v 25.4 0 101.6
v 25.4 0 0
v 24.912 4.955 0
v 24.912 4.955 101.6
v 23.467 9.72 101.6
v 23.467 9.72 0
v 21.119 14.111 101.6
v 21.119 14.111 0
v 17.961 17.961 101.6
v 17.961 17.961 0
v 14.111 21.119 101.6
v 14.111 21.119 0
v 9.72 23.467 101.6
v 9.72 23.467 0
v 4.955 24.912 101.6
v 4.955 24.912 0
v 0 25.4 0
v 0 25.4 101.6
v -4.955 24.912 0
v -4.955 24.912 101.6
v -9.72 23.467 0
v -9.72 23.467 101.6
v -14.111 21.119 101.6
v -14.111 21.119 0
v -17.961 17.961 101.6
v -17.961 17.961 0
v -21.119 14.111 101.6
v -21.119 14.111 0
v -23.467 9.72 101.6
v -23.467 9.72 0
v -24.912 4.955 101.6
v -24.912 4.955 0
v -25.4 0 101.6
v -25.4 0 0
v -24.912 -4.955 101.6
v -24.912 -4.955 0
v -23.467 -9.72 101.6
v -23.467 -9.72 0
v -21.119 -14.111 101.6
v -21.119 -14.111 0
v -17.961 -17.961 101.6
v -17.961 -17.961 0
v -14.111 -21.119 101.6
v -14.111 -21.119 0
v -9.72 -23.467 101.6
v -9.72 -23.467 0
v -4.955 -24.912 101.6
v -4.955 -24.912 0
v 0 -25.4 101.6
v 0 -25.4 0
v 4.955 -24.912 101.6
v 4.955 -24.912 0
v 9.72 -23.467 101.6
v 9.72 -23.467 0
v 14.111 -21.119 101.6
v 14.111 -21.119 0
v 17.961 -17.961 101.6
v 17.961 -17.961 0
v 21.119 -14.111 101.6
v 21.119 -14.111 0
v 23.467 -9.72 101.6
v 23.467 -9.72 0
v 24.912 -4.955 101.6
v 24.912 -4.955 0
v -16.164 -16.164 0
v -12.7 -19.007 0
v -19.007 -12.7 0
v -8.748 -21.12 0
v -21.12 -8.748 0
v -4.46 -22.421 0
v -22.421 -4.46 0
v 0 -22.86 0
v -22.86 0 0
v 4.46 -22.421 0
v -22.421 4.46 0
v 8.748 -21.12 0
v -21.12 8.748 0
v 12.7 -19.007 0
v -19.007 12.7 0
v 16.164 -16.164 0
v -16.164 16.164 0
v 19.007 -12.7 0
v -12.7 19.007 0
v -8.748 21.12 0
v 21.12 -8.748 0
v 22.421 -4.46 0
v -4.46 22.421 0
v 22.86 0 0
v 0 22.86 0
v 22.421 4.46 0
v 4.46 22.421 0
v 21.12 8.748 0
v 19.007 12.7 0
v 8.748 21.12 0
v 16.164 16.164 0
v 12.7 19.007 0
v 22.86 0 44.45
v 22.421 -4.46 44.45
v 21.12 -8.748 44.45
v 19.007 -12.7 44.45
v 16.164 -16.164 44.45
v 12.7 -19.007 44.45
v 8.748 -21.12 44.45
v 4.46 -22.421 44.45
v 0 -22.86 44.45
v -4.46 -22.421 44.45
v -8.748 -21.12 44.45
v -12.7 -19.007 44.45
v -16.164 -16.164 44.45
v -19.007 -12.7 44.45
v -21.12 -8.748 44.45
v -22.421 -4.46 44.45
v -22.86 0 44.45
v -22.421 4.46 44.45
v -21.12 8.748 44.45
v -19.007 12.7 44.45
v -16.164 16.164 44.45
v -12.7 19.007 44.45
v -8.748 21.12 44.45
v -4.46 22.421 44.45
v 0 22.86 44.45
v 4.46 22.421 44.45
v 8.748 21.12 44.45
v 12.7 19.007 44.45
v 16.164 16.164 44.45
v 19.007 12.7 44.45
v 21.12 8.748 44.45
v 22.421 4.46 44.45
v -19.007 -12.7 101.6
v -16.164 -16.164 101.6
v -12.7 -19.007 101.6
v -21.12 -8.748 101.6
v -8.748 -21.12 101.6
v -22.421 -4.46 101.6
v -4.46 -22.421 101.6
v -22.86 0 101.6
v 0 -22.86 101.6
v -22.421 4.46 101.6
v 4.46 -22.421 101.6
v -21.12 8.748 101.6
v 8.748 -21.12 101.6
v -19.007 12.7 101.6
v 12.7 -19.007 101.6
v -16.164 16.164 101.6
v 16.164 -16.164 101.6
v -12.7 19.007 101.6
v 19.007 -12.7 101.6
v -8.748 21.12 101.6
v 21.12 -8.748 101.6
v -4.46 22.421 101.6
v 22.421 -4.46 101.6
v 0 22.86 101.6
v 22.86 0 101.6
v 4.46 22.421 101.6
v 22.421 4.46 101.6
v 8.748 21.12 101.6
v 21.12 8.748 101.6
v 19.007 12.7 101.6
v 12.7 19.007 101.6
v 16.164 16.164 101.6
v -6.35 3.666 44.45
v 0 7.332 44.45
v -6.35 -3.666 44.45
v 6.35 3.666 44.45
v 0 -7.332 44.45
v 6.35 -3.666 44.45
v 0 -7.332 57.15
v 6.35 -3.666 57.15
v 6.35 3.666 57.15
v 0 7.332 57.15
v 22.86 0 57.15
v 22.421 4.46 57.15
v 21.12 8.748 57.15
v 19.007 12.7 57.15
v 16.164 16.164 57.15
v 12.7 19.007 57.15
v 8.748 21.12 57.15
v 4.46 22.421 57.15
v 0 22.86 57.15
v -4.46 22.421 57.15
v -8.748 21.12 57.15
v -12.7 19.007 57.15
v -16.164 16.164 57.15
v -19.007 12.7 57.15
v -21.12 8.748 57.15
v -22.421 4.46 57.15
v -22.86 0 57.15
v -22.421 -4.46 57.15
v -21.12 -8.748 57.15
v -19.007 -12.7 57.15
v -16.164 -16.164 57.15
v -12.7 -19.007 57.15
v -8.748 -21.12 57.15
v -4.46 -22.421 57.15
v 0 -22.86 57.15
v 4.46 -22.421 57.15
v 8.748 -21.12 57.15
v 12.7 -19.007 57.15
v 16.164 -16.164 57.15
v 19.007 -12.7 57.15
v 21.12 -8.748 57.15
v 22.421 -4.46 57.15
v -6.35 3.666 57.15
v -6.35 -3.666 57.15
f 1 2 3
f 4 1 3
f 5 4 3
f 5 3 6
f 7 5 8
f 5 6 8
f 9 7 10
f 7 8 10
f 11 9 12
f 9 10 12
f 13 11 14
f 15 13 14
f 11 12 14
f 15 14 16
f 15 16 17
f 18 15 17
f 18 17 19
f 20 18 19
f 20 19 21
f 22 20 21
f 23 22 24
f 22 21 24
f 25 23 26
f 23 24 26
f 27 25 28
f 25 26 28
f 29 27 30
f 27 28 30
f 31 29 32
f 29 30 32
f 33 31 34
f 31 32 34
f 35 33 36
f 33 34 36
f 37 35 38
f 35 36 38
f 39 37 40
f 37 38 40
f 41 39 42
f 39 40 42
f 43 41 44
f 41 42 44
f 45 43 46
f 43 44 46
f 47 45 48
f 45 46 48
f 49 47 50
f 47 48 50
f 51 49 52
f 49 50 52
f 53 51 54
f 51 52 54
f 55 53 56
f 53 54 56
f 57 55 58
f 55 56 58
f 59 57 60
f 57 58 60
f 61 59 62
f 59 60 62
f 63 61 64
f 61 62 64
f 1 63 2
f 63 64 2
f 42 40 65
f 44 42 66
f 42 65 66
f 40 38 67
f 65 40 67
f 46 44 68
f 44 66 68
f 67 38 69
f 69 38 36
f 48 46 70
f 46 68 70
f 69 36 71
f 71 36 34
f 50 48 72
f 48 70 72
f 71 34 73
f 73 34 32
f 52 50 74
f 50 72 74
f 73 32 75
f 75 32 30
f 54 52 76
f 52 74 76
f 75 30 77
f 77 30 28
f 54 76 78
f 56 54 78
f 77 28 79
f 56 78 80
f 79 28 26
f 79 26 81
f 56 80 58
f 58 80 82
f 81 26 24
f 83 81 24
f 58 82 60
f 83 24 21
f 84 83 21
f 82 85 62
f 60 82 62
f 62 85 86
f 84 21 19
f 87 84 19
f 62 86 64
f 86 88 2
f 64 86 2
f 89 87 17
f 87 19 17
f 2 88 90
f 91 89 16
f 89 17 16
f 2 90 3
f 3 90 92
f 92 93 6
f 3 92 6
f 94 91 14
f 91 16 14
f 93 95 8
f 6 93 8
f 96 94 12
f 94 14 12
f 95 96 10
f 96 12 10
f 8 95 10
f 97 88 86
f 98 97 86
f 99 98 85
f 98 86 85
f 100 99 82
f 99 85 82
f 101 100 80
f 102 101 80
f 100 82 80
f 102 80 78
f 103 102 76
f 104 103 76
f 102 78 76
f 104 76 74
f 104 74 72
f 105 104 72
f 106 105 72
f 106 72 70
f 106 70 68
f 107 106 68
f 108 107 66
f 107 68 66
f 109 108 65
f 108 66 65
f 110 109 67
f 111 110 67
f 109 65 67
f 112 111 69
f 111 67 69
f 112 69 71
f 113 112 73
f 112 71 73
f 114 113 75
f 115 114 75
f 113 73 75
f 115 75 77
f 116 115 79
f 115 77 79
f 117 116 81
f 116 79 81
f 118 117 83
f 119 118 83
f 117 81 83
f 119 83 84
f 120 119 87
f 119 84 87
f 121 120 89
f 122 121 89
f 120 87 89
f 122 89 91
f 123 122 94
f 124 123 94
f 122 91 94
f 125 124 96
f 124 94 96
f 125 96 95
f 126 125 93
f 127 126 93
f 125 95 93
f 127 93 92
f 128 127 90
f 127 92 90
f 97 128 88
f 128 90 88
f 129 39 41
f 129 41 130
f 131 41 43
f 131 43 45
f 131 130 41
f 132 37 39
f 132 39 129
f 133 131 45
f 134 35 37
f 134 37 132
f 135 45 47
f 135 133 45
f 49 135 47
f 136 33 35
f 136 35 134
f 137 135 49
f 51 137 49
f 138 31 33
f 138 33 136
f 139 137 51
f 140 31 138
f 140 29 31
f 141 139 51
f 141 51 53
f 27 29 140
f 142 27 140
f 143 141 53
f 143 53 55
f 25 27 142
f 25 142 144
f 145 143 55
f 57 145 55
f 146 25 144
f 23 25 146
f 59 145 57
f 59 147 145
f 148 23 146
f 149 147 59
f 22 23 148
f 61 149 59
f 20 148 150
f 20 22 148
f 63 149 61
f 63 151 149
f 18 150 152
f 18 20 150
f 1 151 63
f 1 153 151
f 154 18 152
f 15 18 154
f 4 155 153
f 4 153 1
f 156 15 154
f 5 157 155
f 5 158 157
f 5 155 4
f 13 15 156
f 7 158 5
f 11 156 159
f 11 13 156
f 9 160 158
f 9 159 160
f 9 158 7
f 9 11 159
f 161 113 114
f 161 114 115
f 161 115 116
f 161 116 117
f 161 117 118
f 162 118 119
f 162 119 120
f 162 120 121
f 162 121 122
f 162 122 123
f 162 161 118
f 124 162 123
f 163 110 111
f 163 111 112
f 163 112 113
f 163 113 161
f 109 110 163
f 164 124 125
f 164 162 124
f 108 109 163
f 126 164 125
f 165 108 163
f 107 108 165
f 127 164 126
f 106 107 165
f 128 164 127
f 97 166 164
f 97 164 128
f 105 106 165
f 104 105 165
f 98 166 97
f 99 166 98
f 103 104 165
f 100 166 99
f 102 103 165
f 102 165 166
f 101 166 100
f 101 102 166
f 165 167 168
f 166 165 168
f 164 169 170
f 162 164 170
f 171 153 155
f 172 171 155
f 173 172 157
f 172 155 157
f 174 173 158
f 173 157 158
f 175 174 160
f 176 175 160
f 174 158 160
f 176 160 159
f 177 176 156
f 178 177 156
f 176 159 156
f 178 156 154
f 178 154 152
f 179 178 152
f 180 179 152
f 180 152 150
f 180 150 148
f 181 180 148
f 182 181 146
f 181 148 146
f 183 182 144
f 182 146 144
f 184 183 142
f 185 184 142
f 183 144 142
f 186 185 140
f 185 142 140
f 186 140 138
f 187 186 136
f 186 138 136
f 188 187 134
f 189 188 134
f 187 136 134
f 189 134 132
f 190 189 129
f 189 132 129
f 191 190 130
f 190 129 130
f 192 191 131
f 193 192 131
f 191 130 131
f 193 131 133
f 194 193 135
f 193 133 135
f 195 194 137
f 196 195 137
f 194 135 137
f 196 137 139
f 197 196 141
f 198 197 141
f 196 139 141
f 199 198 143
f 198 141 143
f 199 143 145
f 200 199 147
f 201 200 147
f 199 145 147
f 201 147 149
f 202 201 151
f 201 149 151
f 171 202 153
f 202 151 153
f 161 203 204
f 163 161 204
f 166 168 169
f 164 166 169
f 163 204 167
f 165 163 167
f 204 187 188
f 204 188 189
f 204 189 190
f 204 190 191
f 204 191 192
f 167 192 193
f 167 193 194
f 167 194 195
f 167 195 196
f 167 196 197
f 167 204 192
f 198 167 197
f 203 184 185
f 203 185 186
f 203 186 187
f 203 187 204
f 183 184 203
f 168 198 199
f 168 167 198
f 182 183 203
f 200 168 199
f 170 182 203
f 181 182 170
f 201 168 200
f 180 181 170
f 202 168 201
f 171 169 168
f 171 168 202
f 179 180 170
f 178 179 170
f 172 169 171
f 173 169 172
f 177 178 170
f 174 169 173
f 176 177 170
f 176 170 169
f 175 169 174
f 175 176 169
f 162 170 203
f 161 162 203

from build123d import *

# Parameters (mm, degrees)
F0_R     = 25.4
F1_DEPTH = 101.6
F2_R     = 22.86
F3_DEPTH = 44.45
F4_R     = 22.86
F5_DEPTH = 44.45
F7_DEPTH = 57.151


with BuildPart() as f1:
    # F0 (on Top) → F1 (new body)
    with BuildSketch(Plane.XY):
        Circle(F0_R)
    extrude(amount=F1_DEPTH)

    # F2 (on face) → F3 (cut)
    with BuildSketch(Plane(origin=(0, 0, 0), x_dir=(1, 0, 0), z_dir=(0, 0, -1))):
        Circle(F2_R)
    extrude(amount=-F3_DEPTH, mode=Mode.SUBTRACT)

    # F4 (on face) → F5 (cut)
    with BuildSketch(Plane.XY.offset(101.6)):
        Circle(F4_R)
    extrude(amount=-F5_DEPTH, mode=Mode.SUBTRACT)

    # F6 (on face) → F7 (cut, through all)
    with BuildSketch(Plane.XY.offset(57.15)):
        Polygon((6.35, 3.666174), (0, 7.332348), (-6.35, 3.666174), (-6.35, -3.666174), (0, -7.332348), (6.35, -3.666174), align=None)
    extrude(amount=-F7_DEPTH, mode=Mode.SUBTRACT)


solid = f1.part
